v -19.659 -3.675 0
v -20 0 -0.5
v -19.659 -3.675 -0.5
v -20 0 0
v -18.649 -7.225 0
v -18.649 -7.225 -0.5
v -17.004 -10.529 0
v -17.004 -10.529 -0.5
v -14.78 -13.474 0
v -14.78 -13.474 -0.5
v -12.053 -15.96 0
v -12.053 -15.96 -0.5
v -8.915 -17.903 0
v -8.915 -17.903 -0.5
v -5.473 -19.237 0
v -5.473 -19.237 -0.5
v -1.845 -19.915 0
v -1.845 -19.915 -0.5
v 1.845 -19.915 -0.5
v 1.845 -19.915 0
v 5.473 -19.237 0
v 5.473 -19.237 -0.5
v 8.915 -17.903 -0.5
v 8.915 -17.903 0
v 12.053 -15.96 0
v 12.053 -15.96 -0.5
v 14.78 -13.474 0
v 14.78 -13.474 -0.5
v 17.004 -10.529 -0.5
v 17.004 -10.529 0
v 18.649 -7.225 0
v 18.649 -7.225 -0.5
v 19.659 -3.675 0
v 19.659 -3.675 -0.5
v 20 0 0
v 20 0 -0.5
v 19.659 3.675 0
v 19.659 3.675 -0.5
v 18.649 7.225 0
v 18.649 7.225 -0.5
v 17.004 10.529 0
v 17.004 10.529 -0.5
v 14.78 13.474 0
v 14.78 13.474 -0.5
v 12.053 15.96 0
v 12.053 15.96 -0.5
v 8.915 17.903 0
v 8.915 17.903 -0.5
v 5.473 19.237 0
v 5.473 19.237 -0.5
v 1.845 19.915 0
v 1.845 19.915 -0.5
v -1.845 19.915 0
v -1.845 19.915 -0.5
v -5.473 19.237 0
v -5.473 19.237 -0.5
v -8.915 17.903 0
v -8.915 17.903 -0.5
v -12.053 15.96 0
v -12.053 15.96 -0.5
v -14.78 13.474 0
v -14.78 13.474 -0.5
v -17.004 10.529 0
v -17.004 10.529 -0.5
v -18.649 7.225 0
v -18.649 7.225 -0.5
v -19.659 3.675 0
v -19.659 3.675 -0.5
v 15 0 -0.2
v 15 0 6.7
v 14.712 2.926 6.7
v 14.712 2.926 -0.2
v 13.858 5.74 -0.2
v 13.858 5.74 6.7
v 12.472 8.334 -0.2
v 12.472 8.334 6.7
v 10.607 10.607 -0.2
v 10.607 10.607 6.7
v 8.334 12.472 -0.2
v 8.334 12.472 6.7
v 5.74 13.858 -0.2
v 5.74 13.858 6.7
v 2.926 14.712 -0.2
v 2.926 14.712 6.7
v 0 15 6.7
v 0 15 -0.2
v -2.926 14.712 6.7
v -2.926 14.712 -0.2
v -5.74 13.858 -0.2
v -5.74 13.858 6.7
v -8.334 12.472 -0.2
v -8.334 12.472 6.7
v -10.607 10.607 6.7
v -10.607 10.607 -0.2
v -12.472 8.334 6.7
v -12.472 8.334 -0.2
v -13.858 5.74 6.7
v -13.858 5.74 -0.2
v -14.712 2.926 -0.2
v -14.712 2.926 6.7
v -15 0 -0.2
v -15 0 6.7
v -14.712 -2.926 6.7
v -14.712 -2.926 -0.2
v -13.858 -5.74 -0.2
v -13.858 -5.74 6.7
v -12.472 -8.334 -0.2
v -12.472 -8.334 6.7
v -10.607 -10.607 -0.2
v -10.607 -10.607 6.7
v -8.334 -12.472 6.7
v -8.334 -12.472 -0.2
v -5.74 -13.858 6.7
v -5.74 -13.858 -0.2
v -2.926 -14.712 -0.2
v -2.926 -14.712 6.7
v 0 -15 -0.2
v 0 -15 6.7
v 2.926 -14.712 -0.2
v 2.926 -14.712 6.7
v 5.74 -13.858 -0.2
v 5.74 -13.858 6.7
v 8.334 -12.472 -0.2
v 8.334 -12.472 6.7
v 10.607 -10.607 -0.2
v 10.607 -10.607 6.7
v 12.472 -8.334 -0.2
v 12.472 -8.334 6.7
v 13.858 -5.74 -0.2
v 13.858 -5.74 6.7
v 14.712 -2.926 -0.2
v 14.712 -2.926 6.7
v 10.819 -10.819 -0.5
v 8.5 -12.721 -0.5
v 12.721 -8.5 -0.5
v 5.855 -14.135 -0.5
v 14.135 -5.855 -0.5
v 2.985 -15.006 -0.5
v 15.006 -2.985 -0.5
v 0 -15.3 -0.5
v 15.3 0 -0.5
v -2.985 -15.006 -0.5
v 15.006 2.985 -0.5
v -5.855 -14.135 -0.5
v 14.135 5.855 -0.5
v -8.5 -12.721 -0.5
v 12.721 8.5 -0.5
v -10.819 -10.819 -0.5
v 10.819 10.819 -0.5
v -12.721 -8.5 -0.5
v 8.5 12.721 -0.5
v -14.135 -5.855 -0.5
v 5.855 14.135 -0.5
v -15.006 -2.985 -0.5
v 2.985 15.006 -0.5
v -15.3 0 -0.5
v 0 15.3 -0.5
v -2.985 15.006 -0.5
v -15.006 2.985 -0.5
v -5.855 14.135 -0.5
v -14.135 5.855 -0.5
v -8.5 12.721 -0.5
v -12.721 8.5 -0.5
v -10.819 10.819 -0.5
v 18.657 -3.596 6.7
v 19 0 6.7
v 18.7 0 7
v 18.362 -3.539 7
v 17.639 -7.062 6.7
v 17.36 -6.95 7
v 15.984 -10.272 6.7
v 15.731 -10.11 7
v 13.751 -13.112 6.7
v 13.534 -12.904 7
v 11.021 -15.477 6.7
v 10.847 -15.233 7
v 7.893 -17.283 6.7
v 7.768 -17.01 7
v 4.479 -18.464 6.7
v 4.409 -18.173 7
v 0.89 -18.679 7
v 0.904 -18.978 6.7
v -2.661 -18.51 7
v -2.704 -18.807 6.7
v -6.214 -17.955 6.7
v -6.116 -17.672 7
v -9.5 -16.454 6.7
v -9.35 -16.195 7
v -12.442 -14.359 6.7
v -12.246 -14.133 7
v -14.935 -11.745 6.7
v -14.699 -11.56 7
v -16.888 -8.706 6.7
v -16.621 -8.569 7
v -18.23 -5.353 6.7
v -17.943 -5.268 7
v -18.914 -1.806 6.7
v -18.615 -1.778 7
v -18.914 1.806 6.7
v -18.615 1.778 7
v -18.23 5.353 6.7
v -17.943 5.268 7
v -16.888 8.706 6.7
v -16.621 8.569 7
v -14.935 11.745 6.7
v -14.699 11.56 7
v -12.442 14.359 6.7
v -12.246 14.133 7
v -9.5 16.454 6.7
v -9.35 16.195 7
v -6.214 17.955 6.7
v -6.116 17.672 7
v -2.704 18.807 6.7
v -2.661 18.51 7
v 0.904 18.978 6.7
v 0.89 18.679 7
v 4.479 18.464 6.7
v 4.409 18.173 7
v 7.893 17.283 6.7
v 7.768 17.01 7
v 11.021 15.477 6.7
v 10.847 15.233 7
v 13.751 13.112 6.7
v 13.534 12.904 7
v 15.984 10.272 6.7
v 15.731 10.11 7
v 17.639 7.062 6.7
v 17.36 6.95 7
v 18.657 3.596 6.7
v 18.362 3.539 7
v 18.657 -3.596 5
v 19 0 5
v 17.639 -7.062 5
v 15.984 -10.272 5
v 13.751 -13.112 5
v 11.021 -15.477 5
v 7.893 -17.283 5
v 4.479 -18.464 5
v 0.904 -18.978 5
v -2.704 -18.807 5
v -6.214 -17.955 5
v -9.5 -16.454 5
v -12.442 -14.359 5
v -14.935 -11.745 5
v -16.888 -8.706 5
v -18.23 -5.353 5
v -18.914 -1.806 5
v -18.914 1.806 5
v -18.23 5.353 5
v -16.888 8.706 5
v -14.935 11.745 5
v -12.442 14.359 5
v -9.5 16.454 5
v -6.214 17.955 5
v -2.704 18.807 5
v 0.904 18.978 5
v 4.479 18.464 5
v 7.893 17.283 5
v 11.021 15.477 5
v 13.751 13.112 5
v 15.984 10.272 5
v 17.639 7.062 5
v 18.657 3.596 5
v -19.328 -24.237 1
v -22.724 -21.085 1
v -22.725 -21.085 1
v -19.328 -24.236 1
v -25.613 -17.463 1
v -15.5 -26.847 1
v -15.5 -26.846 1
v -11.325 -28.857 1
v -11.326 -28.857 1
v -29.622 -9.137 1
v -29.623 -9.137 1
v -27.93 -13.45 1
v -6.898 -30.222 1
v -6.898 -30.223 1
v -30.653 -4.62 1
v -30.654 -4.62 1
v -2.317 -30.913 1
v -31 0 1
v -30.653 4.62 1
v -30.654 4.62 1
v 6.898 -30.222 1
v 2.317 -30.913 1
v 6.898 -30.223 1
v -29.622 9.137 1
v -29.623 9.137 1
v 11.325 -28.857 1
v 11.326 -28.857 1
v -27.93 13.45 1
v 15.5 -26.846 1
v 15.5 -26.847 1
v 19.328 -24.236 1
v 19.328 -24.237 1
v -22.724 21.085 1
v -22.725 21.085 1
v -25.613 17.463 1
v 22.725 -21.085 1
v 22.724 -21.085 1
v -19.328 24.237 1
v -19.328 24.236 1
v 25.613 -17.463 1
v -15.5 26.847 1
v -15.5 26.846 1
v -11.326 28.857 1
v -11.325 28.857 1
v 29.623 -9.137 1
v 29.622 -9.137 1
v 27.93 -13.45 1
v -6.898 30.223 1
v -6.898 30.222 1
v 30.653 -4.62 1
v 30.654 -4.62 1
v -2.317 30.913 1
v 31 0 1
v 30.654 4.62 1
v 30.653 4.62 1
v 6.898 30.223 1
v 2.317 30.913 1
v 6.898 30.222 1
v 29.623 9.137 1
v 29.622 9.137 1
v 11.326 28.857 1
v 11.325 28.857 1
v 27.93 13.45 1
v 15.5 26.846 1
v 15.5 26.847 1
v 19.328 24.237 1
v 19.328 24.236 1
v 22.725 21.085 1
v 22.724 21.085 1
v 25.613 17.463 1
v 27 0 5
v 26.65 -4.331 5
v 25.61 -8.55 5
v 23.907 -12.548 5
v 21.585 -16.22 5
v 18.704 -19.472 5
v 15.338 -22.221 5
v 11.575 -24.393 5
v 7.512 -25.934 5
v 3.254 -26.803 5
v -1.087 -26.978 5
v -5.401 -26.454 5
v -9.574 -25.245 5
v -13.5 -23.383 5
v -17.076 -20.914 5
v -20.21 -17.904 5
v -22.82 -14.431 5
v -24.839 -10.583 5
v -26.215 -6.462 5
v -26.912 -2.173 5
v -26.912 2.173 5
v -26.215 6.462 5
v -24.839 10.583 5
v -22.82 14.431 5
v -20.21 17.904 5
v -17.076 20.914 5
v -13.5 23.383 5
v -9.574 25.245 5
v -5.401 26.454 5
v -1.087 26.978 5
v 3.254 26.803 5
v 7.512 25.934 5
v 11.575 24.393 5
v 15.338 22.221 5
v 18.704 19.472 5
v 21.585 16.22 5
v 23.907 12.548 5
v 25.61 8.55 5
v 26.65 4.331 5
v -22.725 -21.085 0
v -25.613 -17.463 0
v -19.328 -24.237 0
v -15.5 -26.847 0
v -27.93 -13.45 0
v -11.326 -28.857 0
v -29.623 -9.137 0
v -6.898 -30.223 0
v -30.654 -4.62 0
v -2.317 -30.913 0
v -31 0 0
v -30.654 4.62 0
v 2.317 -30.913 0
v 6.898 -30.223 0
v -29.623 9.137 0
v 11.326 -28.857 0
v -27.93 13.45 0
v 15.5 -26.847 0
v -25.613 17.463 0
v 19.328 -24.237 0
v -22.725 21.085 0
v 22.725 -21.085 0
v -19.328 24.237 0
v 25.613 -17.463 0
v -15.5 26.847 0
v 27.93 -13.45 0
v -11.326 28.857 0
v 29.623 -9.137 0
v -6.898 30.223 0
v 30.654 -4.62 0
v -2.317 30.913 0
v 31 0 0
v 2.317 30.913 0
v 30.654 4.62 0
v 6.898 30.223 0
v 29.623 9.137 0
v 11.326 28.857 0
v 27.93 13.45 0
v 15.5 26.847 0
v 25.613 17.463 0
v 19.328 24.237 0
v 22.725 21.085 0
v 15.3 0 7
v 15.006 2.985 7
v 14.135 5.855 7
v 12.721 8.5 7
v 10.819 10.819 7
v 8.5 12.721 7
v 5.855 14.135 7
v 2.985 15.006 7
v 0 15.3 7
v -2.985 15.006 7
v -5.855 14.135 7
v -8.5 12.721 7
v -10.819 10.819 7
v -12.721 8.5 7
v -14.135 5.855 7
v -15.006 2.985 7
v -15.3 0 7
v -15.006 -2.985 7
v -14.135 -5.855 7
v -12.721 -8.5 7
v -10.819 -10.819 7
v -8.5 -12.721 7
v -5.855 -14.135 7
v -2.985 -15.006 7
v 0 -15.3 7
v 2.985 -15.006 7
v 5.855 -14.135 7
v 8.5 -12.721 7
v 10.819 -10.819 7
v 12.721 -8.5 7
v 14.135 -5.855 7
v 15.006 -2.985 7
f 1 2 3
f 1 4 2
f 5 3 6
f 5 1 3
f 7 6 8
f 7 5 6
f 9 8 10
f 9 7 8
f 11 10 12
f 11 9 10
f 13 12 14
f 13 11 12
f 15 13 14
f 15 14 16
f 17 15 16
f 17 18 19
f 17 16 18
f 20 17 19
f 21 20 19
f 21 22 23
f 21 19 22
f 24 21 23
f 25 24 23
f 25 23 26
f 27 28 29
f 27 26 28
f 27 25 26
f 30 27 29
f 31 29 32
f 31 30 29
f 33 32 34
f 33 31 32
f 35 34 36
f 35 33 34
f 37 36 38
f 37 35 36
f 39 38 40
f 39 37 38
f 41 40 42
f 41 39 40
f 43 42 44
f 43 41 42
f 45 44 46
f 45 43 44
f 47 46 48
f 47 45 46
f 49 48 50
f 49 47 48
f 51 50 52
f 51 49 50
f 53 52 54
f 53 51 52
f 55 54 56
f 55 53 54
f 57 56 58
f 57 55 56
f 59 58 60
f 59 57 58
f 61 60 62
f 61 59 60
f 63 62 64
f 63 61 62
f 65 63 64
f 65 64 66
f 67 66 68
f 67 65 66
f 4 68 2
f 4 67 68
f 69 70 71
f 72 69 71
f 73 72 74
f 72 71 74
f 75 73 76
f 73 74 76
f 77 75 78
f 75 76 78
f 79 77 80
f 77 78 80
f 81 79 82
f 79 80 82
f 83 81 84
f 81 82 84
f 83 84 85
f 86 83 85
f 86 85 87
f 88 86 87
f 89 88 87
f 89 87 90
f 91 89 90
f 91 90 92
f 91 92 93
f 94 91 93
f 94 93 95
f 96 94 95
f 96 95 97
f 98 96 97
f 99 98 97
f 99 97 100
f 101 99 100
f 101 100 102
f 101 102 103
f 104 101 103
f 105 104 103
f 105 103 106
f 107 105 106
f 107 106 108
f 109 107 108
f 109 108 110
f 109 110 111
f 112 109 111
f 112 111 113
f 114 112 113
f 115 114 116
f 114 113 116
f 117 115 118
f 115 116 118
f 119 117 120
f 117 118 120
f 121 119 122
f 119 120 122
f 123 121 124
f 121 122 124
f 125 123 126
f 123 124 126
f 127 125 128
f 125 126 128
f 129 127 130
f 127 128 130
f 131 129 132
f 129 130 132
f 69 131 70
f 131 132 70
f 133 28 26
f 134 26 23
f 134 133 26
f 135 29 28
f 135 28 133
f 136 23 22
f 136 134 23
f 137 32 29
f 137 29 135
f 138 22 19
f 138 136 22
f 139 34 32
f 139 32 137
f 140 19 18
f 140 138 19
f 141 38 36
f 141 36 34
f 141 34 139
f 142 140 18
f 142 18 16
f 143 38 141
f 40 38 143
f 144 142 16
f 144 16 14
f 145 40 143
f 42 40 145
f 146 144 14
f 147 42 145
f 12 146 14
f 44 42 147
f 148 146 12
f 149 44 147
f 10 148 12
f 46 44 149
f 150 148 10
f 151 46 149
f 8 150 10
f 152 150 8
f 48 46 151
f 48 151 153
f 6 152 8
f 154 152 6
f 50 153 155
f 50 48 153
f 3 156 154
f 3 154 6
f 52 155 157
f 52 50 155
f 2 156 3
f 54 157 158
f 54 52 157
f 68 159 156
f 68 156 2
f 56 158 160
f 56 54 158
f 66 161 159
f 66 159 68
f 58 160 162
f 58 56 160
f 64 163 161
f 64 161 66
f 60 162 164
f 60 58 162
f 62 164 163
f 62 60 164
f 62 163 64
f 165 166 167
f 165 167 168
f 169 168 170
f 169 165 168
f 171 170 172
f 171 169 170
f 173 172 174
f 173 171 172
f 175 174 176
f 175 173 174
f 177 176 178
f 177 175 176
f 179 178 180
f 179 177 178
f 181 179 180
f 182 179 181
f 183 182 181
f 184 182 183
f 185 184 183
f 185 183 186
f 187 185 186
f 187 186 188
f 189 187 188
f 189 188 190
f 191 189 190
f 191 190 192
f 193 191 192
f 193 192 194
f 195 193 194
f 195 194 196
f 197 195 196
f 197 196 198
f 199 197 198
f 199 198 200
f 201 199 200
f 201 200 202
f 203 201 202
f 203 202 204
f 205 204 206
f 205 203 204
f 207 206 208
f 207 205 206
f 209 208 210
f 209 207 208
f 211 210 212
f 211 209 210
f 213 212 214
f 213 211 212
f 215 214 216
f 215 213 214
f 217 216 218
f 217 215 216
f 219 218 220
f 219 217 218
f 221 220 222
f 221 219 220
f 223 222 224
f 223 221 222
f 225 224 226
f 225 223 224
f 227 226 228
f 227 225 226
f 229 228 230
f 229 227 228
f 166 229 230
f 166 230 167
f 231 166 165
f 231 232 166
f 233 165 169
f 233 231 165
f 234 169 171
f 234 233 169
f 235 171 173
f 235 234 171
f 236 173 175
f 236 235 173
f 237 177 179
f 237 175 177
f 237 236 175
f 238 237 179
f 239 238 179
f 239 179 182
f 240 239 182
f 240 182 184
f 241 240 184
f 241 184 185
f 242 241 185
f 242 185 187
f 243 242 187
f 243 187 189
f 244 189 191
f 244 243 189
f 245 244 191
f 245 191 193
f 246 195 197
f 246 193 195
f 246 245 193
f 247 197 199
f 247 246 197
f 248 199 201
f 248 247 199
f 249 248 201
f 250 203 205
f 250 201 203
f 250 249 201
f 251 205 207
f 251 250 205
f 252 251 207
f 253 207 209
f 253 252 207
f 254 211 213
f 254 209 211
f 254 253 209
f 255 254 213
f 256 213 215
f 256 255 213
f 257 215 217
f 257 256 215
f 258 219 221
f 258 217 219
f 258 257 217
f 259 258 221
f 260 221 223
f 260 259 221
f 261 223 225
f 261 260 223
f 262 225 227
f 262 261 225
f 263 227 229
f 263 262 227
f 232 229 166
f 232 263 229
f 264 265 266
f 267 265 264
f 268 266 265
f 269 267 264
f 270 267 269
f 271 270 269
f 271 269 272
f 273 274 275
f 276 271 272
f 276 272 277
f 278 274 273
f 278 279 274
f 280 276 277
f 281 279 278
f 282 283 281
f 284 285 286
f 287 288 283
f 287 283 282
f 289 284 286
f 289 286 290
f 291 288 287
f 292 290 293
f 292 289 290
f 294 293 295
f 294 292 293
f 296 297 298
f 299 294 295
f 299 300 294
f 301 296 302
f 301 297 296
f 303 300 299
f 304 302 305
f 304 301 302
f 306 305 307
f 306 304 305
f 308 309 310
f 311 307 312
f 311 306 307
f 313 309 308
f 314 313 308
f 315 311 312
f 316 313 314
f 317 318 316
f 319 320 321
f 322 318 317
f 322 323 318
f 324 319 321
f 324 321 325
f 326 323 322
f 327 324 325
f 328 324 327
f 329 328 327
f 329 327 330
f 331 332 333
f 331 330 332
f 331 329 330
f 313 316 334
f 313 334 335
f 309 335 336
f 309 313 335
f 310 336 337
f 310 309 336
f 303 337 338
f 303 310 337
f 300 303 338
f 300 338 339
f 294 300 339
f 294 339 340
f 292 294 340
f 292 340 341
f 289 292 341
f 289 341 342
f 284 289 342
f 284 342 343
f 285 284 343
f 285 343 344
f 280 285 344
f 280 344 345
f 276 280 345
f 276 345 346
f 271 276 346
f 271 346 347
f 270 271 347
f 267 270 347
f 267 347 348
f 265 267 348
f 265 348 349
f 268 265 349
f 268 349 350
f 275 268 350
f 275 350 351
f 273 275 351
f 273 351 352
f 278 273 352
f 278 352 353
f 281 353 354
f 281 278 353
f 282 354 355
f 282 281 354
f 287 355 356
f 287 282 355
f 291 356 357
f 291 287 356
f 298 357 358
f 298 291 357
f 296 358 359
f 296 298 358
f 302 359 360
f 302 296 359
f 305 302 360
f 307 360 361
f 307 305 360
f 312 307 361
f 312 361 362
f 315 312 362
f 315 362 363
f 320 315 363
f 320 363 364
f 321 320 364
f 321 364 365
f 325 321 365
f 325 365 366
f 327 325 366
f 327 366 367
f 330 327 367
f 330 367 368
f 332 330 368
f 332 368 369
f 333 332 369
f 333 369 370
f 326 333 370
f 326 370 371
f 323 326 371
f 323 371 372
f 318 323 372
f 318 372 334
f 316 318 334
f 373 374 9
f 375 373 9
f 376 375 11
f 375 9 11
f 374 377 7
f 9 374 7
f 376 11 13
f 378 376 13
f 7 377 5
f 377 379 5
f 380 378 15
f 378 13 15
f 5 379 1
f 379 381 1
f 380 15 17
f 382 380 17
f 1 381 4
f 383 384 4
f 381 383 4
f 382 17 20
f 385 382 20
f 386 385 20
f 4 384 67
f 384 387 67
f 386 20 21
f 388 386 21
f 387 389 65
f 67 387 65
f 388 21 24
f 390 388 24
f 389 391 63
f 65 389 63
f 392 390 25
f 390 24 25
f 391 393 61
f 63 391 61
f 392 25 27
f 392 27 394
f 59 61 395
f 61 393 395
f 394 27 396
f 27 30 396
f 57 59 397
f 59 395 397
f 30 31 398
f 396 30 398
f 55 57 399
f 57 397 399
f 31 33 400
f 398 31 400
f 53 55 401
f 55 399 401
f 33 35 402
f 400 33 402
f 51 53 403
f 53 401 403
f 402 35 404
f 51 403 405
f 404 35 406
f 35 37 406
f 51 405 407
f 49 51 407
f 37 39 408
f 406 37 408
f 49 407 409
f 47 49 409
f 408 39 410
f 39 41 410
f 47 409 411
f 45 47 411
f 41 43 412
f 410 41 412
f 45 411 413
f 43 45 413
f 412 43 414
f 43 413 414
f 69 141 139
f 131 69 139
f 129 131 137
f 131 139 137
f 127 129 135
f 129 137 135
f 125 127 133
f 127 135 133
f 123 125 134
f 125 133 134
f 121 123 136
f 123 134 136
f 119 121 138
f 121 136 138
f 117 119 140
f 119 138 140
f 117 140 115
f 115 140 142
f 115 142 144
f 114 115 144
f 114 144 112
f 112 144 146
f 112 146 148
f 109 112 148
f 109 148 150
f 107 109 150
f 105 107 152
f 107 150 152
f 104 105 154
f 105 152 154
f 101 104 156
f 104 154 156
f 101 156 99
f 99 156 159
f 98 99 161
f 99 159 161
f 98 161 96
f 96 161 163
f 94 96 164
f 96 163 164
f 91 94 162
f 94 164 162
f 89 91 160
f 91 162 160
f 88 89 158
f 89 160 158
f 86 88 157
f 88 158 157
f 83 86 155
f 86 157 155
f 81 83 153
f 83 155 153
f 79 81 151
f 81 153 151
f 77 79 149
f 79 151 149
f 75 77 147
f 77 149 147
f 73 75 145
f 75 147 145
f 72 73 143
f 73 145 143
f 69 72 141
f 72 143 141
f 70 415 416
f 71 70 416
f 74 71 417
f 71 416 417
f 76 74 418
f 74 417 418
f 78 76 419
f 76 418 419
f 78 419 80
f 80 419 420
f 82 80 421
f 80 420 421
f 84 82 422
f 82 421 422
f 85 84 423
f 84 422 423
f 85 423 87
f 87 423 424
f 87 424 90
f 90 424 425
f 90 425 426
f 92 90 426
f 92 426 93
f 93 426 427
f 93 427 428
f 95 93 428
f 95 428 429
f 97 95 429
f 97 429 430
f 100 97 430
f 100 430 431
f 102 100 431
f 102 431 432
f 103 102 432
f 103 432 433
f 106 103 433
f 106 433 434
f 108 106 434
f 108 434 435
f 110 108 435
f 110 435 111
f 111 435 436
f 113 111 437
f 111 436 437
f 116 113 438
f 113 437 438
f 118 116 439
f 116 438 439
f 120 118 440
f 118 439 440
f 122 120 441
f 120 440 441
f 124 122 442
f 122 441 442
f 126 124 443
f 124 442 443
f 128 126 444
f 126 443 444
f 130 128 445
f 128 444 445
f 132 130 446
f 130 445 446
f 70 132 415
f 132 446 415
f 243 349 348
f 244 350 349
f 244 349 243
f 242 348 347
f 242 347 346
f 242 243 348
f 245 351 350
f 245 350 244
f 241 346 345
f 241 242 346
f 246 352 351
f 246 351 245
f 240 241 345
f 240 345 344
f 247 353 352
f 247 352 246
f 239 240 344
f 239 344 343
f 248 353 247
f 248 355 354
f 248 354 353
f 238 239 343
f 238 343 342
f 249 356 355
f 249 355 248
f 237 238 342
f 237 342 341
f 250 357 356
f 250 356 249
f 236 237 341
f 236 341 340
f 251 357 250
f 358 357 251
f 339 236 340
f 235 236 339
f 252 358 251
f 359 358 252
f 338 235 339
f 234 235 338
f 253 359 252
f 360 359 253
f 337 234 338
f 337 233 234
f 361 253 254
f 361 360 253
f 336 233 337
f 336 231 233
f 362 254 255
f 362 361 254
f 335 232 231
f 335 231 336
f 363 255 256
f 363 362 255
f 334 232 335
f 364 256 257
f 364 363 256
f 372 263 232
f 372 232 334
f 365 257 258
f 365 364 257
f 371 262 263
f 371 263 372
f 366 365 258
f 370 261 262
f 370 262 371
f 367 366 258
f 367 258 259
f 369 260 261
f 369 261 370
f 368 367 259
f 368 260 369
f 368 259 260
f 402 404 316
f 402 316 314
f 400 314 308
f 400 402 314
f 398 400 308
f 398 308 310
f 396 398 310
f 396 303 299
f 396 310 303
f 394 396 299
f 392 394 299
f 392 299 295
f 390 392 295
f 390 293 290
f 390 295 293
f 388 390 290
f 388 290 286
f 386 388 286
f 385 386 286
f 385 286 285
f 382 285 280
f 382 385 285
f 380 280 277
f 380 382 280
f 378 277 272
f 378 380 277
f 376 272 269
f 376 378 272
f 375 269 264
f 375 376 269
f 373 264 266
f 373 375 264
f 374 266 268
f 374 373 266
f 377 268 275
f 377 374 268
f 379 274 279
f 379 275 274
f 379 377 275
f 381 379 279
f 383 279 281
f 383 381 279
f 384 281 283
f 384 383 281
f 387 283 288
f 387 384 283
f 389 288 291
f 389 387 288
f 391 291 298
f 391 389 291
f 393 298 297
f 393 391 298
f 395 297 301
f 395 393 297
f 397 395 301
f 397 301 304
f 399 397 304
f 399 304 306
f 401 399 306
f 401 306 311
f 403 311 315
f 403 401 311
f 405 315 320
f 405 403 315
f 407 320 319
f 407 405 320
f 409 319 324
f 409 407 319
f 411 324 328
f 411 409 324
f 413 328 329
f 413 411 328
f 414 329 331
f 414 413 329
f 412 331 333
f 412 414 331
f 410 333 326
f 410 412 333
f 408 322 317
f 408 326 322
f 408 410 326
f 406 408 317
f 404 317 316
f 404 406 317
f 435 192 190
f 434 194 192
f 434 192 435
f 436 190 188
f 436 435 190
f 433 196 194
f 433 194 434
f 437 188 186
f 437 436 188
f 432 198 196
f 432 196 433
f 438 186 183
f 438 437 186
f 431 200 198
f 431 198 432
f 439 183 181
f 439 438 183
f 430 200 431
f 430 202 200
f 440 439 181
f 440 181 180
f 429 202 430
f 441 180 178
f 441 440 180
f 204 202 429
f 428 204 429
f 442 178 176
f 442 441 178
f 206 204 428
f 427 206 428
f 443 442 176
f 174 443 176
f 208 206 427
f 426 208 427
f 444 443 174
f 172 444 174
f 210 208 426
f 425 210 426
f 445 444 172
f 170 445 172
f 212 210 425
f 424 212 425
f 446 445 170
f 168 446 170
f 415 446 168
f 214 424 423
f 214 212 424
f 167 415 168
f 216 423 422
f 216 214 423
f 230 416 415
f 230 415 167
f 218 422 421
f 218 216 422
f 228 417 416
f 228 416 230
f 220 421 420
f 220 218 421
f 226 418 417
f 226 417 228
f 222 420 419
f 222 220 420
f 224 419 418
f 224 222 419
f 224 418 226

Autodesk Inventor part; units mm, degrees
ref_plane "YZ Plane" through (0, 0, 0) normal (1, 0, 0) x (0, 1, 0)
ref_plane "XZ Plane" through (0, 0, 0) normal (0, 1, 0) x (-1, 0, 0)
ref_plane "XY Plane" through (0, 0, 0) normal (0, 0, 1) x (1, 0, 0)
sketch "草圖1" plane through (0, 0, 0) normal (0, 0, 1) x (1, 0, 0)
  circle A0 centre (0, 0) radius 31
  dimension "d0" = 62
extrude "擠出1" add sketch "草圖1" along normal blind 1
sketch "草圖2" plane through (0, 0, 1) normal (0, 0, 1) x (1, 0, 0)
  circle A0 centre (0, 0) radius 31 projected
  circle A1 centre (0, 0) radius 27
  dimension "d3" = 54
extrude "擠出2" add sketch "草圖2" along normal blind 4 contours A1
sketch "草圖3" plane through (0, 0, 5) normal (0, 0, 1) x (1, 0, 0)
  circle A0 centre (0, 0) radius 27 projected
  circle A1 centre (0, 0) radius 19
  dimension "d6" = 38
extrude "擠出3" add sketch "草圖3" along normal blind 2 contours A1
sketch "草圖4" plane through (0, 0, 0) normal (0, 0, -1) x (-1, 0, 0)
  circle A0 centre (0, 0) radius 31 projected
  circle A1 centre (0, 0) radius 20
  dimension "d9" = 40
extrude "擠出4" add sketch "草圖4" along normal blind 0.5 contours A1
sketch "草圖5" plane through (0, 0, 7) normal (0, 0, 1) x (1, 0, 0)
  circle A0 centre (0, 0) radius 19 projected
  circle A1 centre (0, 0) radius 15
  dimension "d12" = 30
extrude "擠出5" cut sketch "草圖5" against normal through all contours A1
chamfer "倒角1" distance 4 angle 45 1 edges at (-27, 0, 1)
chamfer "倒角2" distance 0.3 angle 45 3 edges at (-15, 0, 7) (-15, 0, -0.5) (-19, 0, 7)
properties part number "KM-20140709-07-Kashiyama 機械油封墊片(T=7.5)"
